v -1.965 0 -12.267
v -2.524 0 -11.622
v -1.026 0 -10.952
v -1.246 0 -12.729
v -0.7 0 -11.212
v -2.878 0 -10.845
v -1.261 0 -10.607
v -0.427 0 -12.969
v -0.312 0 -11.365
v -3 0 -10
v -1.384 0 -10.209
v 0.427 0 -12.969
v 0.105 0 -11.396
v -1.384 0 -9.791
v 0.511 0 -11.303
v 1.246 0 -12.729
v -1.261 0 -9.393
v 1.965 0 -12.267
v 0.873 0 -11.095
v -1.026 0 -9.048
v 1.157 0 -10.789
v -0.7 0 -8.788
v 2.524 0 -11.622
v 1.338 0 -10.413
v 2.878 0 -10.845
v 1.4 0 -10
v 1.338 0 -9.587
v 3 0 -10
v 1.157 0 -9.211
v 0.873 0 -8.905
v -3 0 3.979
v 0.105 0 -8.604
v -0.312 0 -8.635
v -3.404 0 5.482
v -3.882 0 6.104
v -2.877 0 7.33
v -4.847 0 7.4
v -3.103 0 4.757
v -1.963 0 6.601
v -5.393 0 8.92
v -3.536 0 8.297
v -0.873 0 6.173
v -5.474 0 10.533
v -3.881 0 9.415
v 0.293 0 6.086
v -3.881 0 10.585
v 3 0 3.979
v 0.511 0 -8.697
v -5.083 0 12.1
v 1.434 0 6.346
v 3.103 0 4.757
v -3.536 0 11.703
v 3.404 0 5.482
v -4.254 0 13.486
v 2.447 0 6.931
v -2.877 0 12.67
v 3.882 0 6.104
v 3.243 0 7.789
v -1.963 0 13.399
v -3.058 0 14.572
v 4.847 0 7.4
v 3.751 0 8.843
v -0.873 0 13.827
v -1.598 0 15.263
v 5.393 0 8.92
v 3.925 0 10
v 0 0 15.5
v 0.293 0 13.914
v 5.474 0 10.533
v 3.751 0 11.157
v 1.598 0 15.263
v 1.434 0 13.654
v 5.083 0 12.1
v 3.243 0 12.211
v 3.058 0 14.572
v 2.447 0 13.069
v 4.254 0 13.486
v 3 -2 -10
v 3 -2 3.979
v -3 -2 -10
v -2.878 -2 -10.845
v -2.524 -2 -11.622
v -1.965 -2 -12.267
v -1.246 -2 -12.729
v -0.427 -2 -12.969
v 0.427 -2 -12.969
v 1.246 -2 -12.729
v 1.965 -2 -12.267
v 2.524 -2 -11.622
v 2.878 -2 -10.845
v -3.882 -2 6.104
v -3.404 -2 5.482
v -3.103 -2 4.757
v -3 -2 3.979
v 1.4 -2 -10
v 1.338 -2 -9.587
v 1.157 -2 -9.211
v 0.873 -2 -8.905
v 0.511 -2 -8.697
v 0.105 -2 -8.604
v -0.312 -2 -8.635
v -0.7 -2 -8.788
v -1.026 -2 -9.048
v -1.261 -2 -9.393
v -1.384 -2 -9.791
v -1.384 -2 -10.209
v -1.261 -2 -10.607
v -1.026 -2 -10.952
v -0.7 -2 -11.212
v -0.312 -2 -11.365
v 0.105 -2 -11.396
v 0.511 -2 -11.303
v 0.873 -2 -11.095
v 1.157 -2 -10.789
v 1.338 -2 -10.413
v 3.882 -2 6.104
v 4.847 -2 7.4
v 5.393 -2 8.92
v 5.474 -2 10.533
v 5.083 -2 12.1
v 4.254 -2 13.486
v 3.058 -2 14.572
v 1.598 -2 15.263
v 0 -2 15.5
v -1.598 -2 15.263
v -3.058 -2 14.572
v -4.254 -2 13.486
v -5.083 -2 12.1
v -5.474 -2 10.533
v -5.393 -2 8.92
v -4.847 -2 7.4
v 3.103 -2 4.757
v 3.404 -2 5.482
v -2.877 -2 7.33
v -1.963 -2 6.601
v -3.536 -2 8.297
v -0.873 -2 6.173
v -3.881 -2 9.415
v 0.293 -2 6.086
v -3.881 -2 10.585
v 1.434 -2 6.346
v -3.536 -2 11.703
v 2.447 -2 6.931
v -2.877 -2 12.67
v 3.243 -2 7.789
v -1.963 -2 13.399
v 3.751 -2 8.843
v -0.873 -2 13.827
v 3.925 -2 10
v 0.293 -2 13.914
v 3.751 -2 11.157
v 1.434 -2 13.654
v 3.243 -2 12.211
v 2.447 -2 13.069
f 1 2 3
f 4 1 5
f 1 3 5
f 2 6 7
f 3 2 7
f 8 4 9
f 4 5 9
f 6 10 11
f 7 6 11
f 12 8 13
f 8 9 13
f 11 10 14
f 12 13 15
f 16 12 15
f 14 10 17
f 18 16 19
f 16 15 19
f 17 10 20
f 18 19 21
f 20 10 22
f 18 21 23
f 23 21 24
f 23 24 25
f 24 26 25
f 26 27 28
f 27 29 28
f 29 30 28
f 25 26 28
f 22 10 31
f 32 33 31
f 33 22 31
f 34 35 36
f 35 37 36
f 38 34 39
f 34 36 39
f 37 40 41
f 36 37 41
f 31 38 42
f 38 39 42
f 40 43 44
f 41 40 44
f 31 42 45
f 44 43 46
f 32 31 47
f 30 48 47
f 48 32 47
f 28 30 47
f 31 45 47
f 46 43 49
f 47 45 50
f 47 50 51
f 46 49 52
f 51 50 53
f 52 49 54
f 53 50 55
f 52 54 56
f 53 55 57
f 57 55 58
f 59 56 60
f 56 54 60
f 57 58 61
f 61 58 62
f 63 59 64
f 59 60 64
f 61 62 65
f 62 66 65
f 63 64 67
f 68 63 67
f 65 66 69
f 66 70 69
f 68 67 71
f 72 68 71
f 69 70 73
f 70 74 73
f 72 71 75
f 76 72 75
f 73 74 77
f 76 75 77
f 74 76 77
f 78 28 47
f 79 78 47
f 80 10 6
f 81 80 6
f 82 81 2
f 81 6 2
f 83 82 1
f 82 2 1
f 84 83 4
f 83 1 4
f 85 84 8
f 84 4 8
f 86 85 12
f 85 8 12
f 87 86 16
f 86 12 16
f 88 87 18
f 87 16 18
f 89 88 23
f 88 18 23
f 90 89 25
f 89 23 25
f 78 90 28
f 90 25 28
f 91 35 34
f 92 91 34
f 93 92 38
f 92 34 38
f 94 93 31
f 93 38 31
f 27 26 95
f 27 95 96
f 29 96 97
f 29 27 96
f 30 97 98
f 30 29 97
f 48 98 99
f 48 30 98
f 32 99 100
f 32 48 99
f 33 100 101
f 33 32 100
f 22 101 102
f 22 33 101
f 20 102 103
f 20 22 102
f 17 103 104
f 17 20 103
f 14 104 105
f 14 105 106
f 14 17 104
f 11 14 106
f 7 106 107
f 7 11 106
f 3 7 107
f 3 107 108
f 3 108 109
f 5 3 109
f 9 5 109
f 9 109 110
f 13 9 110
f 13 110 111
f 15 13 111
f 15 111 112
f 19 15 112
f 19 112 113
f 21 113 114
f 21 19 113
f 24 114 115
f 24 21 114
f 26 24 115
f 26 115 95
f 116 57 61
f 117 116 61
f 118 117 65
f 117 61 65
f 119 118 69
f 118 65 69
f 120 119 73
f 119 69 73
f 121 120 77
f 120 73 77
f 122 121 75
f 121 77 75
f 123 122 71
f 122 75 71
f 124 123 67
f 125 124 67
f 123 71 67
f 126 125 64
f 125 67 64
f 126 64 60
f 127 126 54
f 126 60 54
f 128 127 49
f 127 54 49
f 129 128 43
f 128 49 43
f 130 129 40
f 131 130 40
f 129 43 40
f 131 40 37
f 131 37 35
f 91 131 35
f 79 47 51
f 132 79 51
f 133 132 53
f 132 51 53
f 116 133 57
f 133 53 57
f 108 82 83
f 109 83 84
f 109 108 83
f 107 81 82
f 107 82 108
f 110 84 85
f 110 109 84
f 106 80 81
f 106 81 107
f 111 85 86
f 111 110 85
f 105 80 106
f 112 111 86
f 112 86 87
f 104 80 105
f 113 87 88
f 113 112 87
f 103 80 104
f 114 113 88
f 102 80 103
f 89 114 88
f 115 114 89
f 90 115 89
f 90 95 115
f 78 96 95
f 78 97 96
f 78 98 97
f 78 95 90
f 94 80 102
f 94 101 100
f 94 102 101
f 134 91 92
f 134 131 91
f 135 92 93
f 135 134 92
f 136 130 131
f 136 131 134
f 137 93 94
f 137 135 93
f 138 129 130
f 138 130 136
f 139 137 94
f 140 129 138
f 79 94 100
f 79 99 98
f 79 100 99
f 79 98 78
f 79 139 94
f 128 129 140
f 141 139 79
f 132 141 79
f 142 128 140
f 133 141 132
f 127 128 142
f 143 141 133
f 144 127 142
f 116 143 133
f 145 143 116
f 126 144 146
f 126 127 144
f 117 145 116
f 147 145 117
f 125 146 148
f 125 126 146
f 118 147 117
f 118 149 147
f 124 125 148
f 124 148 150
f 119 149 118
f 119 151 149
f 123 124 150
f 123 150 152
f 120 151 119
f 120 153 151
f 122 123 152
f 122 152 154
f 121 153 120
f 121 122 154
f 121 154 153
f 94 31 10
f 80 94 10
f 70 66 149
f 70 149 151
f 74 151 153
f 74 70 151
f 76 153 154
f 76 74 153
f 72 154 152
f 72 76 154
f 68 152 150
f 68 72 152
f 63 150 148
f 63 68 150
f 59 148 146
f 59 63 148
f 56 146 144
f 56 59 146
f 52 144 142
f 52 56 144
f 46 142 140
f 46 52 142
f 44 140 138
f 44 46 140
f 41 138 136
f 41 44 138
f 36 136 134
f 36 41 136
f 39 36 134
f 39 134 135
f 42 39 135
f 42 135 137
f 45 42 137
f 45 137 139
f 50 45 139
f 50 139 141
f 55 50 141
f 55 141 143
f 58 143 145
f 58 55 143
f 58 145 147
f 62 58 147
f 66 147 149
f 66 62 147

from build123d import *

# Parameters (mm, degrees)
F0_R     = 1.4
F0_R_2   = 3.925
F1_DEPTH = 2


with BuildPart() as f1:
    # F0 (on Front) → F1 (new body)
    with BuildSketch(Plane.XZ):
        with BuildLine():
            ThreePointArc((-3.882353, 6.10419), (-3.229356, 5.12965), (-3, 3.979203))
            Line((-3, 3.979203), (-3, 0))
            Line((-3, 0), (-3, -10))
            ThreePointArc((-3, -10), (0, -13), (3, -10))
            Line((3, -10), (3, 0))
            Line((3, 0), (3, 3.979203))
            ThreePointArc((3, 3.979203), (3.229356, 5.12965), (3.882353, 6.10419))
            ThreePointArc((3.882353, 6.10419), (0, 15.5), (-3.882353, 6.10419))
        make_face()
        with Locations((0, -10)):
            Circle(F0_R, mode=Mode.SUBTRACT)
        with Locations((0, 10)):
            Circle(F0_R_2, mode=Mode.SUBTRACT)
    extrude(amount=F1_DEPTH)


solid = f1.part
